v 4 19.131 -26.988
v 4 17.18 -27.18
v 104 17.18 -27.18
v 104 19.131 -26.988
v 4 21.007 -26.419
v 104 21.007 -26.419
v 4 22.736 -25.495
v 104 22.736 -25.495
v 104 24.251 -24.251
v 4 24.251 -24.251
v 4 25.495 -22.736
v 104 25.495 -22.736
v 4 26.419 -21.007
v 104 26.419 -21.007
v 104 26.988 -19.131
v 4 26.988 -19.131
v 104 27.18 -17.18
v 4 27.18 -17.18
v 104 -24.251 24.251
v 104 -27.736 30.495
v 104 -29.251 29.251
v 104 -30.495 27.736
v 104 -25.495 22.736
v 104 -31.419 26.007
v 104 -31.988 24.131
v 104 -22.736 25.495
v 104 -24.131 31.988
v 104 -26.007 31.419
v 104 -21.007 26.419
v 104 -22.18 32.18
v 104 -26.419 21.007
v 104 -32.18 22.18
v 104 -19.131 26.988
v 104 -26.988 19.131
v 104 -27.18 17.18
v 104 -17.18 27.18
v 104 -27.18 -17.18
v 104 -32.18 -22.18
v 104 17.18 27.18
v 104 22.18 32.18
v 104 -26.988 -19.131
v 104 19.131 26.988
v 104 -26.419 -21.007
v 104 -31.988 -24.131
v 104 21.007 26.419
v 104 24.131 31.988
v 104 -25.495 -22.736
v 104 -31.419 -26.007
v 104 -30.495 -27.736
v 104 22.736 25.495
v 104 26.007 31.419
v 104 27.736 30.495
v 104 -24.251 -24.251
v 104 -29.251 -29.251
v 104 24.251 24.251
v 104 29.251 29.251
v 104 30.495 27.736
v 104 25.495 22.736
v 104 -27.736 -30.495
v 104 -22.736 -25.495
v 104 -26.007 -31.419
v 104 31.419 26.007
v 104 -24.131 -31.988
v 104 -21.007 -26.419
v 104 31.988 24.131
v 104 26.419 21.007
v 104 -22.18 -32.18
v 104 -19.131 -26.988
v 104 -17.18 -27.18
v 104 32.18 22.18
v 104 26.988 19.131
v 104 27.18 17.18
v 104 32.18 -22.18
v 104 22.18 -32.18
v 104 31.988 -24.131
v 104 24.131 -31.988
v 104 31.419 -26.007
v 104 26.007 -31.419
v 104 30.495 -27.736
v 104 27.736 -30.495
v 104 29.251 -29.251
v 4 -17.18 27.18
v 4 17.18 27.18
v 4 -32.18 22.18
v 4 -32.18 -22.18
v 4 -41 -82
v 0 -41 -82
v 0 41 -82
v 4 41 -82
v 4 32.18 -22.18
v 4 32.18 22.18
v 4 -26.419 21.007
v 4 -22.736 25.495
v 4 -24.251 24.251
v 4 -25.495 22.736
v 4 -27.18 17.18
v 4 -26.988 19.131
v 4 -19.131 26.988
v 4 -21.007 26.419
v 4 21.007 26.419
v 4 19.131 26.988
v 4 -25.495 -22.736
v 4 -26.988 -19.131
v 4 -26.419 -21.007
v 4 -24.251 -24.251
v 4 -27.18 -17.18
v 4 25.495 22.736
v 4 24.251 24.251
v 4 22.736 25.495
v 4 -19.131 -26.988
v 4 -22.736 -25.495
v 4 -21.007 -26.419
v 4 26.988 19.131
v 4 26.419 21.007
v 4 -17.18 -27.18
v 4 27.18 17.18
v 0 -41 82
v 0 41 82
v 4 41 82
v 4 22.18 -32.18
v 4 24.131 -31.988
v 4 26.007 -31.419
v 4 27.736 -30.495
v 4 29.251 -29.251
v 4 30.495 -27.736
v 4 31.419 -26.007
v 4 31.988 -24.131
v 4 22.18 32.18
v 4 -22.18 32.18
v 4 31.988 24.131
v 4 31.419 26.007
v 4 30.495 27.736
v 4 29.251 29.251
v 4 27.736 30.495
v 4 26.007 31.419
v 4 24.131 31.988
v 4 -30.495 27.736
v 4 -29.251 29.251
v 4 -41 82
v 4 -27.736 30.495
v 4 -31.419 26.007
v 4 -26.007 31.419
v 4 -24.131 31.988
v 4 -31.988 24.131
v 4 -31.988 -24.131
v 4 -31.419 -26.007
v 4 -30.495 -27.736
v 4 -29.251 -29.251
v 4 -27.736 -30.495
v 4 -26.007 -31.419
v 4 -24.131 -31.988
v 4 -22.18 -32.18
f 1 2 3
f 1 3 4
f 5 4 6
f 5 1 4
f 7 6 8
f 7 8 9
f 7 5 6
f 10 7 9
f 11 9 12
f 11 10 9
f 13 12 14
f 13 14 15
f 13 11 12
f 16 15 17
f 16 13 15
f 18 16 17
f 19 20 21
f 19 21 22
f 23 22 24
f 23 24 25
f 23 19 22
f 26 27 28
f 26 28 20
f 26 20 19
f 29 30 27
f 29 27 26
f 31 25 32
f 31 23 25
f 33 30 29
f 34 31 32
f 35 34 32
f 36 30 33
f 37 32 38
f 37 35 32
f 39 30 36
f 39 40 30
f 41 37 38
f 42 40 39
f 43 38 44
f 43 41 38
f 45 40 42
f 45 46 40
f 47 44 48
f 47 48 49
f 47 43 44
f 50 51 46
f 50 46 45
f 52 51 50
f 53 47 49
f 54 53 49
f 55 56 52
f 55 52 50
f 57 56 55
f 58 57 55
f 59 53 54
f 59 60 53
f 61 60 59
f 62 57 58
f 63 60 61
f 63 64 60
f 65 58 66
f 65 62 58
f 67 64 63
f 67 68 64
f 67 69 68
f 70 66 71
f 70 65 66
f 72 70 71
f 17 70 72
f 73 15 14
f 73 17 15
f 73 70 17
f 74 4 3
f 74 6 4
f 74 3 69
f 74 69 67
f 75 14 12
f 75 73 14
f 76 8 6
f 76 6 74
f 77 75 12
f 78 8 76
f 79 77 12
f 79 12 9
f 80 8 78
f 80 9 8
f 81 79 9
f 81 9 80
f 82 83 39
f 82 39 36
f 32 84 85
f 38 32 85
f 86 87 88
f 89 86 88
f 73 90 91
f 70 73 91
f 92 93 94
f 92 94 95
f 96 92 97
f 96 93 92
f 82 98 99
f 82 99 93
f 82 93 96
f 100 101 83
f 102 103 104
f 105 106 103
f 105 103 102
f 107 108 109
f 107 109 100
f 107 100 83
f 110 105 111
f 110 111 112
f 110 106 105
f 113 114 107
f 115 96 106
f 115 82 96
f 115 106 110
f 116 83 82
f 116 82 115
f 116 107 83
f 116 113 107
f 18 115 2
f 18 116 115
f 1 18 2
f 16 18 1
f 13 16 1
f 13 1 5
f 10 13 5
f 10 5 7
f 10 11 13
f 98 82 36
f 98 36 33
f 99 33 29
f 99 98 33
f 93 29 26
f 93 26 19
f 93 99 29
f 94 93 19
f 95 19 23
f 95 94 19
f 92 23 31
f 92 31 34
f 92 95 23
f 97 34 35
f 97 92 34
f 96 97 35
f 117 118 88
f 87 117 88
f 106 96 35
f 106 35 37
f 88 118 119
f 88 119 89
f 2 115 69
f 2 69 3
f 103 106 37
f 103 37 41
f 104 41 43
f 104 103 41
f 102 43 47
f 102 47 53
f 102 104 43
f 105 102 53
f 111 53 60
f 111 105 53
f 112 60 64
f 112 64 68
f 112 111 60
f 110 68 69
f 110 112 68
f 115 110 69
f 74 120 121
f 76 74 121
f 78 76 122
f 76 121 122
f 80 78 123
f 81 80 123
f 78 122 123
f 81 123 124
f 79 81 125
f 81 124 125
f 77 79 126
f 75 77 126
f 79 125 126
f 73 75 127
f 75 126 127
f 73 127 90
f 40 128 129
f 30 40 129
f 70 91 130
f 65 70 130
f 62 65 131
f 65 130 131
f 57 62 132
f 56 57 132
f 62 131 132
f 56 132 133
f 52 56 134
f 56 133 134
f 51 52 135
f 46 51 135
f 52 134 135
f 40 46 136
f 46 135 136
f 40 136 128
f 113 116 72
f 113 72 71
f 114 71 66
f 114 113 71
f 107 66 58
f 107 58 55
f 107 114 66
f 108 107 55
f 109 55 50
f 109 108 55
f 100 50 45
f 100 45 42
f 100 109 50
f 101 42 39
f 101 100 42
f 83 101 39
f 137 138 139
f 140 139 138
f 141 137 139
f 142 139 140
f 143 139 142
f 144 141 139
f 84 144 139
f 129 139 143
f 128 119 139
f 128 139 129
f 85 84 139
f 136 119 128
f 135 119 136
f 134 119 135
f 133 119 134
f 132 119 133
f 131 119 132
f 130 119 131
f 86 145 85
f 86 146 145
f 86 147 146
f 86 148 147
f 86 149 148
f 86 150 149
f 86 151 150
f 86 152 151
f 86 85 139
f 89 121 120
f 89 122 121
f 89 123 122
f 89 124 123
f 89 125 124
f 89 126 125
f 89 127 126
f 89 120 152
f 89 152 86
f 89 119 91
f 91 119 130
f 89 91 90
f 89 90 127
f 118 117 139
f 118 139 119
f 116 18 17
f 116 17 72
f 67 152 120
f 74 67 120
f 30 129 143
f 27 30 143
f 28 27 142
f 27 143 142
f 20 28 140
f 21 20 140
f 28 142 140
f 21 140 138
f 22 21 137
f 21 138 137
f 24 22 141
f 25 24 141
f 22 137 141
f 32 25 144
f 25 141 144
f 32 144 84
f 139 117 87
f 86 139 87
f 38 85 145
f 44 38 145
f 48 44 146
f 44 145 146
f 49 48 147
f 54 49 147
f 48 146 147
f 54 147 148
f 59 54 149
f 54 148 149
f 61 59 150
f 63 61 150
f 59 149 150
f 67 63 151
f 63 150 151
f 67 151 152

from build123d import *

# Parameters (mm, degrees)
SKETCH1_W           = 164
SKETCH1_H           = 82
BOSS_EXTRUDE1_DEPTH = 4
BOSS_EXTRUDE5_DEPTH = 100


with BuildPart() as part:
    # Sketch1 → Boss-Extrude1 (new body)
    with BuildSketch(Plane(origin=(0, 0, 0), x_dir=(0, 0, -1), z_dir=(1, 0, 0))):
        Rectangle(SKETCH1_W, SKETCH1_H)
    extrude(amount=BOSS_EXTRUDE1_DEPTH)

    # Sketch7 → Boss-Extrude5 (add)
    with BuildSketch(Plane(origin=(4, 0, 0), x_dir=(0, 0, -1), z_dir=(1, 0, 0))):
        with BuildLine():
            Line((-22.18, -32.18), (22.18, -32.18))
            ThreePointArc((22.18, -32.18), (29.251067812, -29.251067812), (32.18, -22.18))
            Line((32.18, -22.18), (32.18, 22.18))
            ThreePointArc((32.18, 22.18), (29.251067812, 29.251067812), (22.18, 32.18))
            Line((22.18, 32.18), (-22.18, 32.18))
            ThreePointArc((-22.18, 32.18), (-29.251067812, 29.251067812), (-32.18, 22.18))
            Line((-32.18, 22.18), (-32.18, -22.18))
            ThreePointArc((-32.18, -22.18), (-29.251067812, -29.251067812), (-22.18, -32.18))
        make_face()
        with BuildLine():
            Line((-17.18, -27.18), (17.18, -27.18))
            ThreePointArc((17.18, -27.18), (24.251067812, -24.251067812), (27.18, -17.18))
            Line((27.18, -17.18), (27.18, 17.18))
            ThreePointArc((27.18, 17.18), (24.251067812, 24.251067812), (17.18, 27.18))
            Line((17.18, 27.18), (-17.18, 27.18))
            ThreePointArc((-17.18, 27.18), (-24.251067812, 24.251067812), (-27.18, 17.18))
            Line((-27.18, 17.18), (-27.18, -17.18))
            ThreePointArc((-27.18, -17.18), (-24.251067812, -24.251067812), (-17.18, -27.18))
        make_face(mode=Mode.SUBTRACT)
    extrude(amount=BOSS_EXTRUDE5_DEPTH)


solid = part.part
